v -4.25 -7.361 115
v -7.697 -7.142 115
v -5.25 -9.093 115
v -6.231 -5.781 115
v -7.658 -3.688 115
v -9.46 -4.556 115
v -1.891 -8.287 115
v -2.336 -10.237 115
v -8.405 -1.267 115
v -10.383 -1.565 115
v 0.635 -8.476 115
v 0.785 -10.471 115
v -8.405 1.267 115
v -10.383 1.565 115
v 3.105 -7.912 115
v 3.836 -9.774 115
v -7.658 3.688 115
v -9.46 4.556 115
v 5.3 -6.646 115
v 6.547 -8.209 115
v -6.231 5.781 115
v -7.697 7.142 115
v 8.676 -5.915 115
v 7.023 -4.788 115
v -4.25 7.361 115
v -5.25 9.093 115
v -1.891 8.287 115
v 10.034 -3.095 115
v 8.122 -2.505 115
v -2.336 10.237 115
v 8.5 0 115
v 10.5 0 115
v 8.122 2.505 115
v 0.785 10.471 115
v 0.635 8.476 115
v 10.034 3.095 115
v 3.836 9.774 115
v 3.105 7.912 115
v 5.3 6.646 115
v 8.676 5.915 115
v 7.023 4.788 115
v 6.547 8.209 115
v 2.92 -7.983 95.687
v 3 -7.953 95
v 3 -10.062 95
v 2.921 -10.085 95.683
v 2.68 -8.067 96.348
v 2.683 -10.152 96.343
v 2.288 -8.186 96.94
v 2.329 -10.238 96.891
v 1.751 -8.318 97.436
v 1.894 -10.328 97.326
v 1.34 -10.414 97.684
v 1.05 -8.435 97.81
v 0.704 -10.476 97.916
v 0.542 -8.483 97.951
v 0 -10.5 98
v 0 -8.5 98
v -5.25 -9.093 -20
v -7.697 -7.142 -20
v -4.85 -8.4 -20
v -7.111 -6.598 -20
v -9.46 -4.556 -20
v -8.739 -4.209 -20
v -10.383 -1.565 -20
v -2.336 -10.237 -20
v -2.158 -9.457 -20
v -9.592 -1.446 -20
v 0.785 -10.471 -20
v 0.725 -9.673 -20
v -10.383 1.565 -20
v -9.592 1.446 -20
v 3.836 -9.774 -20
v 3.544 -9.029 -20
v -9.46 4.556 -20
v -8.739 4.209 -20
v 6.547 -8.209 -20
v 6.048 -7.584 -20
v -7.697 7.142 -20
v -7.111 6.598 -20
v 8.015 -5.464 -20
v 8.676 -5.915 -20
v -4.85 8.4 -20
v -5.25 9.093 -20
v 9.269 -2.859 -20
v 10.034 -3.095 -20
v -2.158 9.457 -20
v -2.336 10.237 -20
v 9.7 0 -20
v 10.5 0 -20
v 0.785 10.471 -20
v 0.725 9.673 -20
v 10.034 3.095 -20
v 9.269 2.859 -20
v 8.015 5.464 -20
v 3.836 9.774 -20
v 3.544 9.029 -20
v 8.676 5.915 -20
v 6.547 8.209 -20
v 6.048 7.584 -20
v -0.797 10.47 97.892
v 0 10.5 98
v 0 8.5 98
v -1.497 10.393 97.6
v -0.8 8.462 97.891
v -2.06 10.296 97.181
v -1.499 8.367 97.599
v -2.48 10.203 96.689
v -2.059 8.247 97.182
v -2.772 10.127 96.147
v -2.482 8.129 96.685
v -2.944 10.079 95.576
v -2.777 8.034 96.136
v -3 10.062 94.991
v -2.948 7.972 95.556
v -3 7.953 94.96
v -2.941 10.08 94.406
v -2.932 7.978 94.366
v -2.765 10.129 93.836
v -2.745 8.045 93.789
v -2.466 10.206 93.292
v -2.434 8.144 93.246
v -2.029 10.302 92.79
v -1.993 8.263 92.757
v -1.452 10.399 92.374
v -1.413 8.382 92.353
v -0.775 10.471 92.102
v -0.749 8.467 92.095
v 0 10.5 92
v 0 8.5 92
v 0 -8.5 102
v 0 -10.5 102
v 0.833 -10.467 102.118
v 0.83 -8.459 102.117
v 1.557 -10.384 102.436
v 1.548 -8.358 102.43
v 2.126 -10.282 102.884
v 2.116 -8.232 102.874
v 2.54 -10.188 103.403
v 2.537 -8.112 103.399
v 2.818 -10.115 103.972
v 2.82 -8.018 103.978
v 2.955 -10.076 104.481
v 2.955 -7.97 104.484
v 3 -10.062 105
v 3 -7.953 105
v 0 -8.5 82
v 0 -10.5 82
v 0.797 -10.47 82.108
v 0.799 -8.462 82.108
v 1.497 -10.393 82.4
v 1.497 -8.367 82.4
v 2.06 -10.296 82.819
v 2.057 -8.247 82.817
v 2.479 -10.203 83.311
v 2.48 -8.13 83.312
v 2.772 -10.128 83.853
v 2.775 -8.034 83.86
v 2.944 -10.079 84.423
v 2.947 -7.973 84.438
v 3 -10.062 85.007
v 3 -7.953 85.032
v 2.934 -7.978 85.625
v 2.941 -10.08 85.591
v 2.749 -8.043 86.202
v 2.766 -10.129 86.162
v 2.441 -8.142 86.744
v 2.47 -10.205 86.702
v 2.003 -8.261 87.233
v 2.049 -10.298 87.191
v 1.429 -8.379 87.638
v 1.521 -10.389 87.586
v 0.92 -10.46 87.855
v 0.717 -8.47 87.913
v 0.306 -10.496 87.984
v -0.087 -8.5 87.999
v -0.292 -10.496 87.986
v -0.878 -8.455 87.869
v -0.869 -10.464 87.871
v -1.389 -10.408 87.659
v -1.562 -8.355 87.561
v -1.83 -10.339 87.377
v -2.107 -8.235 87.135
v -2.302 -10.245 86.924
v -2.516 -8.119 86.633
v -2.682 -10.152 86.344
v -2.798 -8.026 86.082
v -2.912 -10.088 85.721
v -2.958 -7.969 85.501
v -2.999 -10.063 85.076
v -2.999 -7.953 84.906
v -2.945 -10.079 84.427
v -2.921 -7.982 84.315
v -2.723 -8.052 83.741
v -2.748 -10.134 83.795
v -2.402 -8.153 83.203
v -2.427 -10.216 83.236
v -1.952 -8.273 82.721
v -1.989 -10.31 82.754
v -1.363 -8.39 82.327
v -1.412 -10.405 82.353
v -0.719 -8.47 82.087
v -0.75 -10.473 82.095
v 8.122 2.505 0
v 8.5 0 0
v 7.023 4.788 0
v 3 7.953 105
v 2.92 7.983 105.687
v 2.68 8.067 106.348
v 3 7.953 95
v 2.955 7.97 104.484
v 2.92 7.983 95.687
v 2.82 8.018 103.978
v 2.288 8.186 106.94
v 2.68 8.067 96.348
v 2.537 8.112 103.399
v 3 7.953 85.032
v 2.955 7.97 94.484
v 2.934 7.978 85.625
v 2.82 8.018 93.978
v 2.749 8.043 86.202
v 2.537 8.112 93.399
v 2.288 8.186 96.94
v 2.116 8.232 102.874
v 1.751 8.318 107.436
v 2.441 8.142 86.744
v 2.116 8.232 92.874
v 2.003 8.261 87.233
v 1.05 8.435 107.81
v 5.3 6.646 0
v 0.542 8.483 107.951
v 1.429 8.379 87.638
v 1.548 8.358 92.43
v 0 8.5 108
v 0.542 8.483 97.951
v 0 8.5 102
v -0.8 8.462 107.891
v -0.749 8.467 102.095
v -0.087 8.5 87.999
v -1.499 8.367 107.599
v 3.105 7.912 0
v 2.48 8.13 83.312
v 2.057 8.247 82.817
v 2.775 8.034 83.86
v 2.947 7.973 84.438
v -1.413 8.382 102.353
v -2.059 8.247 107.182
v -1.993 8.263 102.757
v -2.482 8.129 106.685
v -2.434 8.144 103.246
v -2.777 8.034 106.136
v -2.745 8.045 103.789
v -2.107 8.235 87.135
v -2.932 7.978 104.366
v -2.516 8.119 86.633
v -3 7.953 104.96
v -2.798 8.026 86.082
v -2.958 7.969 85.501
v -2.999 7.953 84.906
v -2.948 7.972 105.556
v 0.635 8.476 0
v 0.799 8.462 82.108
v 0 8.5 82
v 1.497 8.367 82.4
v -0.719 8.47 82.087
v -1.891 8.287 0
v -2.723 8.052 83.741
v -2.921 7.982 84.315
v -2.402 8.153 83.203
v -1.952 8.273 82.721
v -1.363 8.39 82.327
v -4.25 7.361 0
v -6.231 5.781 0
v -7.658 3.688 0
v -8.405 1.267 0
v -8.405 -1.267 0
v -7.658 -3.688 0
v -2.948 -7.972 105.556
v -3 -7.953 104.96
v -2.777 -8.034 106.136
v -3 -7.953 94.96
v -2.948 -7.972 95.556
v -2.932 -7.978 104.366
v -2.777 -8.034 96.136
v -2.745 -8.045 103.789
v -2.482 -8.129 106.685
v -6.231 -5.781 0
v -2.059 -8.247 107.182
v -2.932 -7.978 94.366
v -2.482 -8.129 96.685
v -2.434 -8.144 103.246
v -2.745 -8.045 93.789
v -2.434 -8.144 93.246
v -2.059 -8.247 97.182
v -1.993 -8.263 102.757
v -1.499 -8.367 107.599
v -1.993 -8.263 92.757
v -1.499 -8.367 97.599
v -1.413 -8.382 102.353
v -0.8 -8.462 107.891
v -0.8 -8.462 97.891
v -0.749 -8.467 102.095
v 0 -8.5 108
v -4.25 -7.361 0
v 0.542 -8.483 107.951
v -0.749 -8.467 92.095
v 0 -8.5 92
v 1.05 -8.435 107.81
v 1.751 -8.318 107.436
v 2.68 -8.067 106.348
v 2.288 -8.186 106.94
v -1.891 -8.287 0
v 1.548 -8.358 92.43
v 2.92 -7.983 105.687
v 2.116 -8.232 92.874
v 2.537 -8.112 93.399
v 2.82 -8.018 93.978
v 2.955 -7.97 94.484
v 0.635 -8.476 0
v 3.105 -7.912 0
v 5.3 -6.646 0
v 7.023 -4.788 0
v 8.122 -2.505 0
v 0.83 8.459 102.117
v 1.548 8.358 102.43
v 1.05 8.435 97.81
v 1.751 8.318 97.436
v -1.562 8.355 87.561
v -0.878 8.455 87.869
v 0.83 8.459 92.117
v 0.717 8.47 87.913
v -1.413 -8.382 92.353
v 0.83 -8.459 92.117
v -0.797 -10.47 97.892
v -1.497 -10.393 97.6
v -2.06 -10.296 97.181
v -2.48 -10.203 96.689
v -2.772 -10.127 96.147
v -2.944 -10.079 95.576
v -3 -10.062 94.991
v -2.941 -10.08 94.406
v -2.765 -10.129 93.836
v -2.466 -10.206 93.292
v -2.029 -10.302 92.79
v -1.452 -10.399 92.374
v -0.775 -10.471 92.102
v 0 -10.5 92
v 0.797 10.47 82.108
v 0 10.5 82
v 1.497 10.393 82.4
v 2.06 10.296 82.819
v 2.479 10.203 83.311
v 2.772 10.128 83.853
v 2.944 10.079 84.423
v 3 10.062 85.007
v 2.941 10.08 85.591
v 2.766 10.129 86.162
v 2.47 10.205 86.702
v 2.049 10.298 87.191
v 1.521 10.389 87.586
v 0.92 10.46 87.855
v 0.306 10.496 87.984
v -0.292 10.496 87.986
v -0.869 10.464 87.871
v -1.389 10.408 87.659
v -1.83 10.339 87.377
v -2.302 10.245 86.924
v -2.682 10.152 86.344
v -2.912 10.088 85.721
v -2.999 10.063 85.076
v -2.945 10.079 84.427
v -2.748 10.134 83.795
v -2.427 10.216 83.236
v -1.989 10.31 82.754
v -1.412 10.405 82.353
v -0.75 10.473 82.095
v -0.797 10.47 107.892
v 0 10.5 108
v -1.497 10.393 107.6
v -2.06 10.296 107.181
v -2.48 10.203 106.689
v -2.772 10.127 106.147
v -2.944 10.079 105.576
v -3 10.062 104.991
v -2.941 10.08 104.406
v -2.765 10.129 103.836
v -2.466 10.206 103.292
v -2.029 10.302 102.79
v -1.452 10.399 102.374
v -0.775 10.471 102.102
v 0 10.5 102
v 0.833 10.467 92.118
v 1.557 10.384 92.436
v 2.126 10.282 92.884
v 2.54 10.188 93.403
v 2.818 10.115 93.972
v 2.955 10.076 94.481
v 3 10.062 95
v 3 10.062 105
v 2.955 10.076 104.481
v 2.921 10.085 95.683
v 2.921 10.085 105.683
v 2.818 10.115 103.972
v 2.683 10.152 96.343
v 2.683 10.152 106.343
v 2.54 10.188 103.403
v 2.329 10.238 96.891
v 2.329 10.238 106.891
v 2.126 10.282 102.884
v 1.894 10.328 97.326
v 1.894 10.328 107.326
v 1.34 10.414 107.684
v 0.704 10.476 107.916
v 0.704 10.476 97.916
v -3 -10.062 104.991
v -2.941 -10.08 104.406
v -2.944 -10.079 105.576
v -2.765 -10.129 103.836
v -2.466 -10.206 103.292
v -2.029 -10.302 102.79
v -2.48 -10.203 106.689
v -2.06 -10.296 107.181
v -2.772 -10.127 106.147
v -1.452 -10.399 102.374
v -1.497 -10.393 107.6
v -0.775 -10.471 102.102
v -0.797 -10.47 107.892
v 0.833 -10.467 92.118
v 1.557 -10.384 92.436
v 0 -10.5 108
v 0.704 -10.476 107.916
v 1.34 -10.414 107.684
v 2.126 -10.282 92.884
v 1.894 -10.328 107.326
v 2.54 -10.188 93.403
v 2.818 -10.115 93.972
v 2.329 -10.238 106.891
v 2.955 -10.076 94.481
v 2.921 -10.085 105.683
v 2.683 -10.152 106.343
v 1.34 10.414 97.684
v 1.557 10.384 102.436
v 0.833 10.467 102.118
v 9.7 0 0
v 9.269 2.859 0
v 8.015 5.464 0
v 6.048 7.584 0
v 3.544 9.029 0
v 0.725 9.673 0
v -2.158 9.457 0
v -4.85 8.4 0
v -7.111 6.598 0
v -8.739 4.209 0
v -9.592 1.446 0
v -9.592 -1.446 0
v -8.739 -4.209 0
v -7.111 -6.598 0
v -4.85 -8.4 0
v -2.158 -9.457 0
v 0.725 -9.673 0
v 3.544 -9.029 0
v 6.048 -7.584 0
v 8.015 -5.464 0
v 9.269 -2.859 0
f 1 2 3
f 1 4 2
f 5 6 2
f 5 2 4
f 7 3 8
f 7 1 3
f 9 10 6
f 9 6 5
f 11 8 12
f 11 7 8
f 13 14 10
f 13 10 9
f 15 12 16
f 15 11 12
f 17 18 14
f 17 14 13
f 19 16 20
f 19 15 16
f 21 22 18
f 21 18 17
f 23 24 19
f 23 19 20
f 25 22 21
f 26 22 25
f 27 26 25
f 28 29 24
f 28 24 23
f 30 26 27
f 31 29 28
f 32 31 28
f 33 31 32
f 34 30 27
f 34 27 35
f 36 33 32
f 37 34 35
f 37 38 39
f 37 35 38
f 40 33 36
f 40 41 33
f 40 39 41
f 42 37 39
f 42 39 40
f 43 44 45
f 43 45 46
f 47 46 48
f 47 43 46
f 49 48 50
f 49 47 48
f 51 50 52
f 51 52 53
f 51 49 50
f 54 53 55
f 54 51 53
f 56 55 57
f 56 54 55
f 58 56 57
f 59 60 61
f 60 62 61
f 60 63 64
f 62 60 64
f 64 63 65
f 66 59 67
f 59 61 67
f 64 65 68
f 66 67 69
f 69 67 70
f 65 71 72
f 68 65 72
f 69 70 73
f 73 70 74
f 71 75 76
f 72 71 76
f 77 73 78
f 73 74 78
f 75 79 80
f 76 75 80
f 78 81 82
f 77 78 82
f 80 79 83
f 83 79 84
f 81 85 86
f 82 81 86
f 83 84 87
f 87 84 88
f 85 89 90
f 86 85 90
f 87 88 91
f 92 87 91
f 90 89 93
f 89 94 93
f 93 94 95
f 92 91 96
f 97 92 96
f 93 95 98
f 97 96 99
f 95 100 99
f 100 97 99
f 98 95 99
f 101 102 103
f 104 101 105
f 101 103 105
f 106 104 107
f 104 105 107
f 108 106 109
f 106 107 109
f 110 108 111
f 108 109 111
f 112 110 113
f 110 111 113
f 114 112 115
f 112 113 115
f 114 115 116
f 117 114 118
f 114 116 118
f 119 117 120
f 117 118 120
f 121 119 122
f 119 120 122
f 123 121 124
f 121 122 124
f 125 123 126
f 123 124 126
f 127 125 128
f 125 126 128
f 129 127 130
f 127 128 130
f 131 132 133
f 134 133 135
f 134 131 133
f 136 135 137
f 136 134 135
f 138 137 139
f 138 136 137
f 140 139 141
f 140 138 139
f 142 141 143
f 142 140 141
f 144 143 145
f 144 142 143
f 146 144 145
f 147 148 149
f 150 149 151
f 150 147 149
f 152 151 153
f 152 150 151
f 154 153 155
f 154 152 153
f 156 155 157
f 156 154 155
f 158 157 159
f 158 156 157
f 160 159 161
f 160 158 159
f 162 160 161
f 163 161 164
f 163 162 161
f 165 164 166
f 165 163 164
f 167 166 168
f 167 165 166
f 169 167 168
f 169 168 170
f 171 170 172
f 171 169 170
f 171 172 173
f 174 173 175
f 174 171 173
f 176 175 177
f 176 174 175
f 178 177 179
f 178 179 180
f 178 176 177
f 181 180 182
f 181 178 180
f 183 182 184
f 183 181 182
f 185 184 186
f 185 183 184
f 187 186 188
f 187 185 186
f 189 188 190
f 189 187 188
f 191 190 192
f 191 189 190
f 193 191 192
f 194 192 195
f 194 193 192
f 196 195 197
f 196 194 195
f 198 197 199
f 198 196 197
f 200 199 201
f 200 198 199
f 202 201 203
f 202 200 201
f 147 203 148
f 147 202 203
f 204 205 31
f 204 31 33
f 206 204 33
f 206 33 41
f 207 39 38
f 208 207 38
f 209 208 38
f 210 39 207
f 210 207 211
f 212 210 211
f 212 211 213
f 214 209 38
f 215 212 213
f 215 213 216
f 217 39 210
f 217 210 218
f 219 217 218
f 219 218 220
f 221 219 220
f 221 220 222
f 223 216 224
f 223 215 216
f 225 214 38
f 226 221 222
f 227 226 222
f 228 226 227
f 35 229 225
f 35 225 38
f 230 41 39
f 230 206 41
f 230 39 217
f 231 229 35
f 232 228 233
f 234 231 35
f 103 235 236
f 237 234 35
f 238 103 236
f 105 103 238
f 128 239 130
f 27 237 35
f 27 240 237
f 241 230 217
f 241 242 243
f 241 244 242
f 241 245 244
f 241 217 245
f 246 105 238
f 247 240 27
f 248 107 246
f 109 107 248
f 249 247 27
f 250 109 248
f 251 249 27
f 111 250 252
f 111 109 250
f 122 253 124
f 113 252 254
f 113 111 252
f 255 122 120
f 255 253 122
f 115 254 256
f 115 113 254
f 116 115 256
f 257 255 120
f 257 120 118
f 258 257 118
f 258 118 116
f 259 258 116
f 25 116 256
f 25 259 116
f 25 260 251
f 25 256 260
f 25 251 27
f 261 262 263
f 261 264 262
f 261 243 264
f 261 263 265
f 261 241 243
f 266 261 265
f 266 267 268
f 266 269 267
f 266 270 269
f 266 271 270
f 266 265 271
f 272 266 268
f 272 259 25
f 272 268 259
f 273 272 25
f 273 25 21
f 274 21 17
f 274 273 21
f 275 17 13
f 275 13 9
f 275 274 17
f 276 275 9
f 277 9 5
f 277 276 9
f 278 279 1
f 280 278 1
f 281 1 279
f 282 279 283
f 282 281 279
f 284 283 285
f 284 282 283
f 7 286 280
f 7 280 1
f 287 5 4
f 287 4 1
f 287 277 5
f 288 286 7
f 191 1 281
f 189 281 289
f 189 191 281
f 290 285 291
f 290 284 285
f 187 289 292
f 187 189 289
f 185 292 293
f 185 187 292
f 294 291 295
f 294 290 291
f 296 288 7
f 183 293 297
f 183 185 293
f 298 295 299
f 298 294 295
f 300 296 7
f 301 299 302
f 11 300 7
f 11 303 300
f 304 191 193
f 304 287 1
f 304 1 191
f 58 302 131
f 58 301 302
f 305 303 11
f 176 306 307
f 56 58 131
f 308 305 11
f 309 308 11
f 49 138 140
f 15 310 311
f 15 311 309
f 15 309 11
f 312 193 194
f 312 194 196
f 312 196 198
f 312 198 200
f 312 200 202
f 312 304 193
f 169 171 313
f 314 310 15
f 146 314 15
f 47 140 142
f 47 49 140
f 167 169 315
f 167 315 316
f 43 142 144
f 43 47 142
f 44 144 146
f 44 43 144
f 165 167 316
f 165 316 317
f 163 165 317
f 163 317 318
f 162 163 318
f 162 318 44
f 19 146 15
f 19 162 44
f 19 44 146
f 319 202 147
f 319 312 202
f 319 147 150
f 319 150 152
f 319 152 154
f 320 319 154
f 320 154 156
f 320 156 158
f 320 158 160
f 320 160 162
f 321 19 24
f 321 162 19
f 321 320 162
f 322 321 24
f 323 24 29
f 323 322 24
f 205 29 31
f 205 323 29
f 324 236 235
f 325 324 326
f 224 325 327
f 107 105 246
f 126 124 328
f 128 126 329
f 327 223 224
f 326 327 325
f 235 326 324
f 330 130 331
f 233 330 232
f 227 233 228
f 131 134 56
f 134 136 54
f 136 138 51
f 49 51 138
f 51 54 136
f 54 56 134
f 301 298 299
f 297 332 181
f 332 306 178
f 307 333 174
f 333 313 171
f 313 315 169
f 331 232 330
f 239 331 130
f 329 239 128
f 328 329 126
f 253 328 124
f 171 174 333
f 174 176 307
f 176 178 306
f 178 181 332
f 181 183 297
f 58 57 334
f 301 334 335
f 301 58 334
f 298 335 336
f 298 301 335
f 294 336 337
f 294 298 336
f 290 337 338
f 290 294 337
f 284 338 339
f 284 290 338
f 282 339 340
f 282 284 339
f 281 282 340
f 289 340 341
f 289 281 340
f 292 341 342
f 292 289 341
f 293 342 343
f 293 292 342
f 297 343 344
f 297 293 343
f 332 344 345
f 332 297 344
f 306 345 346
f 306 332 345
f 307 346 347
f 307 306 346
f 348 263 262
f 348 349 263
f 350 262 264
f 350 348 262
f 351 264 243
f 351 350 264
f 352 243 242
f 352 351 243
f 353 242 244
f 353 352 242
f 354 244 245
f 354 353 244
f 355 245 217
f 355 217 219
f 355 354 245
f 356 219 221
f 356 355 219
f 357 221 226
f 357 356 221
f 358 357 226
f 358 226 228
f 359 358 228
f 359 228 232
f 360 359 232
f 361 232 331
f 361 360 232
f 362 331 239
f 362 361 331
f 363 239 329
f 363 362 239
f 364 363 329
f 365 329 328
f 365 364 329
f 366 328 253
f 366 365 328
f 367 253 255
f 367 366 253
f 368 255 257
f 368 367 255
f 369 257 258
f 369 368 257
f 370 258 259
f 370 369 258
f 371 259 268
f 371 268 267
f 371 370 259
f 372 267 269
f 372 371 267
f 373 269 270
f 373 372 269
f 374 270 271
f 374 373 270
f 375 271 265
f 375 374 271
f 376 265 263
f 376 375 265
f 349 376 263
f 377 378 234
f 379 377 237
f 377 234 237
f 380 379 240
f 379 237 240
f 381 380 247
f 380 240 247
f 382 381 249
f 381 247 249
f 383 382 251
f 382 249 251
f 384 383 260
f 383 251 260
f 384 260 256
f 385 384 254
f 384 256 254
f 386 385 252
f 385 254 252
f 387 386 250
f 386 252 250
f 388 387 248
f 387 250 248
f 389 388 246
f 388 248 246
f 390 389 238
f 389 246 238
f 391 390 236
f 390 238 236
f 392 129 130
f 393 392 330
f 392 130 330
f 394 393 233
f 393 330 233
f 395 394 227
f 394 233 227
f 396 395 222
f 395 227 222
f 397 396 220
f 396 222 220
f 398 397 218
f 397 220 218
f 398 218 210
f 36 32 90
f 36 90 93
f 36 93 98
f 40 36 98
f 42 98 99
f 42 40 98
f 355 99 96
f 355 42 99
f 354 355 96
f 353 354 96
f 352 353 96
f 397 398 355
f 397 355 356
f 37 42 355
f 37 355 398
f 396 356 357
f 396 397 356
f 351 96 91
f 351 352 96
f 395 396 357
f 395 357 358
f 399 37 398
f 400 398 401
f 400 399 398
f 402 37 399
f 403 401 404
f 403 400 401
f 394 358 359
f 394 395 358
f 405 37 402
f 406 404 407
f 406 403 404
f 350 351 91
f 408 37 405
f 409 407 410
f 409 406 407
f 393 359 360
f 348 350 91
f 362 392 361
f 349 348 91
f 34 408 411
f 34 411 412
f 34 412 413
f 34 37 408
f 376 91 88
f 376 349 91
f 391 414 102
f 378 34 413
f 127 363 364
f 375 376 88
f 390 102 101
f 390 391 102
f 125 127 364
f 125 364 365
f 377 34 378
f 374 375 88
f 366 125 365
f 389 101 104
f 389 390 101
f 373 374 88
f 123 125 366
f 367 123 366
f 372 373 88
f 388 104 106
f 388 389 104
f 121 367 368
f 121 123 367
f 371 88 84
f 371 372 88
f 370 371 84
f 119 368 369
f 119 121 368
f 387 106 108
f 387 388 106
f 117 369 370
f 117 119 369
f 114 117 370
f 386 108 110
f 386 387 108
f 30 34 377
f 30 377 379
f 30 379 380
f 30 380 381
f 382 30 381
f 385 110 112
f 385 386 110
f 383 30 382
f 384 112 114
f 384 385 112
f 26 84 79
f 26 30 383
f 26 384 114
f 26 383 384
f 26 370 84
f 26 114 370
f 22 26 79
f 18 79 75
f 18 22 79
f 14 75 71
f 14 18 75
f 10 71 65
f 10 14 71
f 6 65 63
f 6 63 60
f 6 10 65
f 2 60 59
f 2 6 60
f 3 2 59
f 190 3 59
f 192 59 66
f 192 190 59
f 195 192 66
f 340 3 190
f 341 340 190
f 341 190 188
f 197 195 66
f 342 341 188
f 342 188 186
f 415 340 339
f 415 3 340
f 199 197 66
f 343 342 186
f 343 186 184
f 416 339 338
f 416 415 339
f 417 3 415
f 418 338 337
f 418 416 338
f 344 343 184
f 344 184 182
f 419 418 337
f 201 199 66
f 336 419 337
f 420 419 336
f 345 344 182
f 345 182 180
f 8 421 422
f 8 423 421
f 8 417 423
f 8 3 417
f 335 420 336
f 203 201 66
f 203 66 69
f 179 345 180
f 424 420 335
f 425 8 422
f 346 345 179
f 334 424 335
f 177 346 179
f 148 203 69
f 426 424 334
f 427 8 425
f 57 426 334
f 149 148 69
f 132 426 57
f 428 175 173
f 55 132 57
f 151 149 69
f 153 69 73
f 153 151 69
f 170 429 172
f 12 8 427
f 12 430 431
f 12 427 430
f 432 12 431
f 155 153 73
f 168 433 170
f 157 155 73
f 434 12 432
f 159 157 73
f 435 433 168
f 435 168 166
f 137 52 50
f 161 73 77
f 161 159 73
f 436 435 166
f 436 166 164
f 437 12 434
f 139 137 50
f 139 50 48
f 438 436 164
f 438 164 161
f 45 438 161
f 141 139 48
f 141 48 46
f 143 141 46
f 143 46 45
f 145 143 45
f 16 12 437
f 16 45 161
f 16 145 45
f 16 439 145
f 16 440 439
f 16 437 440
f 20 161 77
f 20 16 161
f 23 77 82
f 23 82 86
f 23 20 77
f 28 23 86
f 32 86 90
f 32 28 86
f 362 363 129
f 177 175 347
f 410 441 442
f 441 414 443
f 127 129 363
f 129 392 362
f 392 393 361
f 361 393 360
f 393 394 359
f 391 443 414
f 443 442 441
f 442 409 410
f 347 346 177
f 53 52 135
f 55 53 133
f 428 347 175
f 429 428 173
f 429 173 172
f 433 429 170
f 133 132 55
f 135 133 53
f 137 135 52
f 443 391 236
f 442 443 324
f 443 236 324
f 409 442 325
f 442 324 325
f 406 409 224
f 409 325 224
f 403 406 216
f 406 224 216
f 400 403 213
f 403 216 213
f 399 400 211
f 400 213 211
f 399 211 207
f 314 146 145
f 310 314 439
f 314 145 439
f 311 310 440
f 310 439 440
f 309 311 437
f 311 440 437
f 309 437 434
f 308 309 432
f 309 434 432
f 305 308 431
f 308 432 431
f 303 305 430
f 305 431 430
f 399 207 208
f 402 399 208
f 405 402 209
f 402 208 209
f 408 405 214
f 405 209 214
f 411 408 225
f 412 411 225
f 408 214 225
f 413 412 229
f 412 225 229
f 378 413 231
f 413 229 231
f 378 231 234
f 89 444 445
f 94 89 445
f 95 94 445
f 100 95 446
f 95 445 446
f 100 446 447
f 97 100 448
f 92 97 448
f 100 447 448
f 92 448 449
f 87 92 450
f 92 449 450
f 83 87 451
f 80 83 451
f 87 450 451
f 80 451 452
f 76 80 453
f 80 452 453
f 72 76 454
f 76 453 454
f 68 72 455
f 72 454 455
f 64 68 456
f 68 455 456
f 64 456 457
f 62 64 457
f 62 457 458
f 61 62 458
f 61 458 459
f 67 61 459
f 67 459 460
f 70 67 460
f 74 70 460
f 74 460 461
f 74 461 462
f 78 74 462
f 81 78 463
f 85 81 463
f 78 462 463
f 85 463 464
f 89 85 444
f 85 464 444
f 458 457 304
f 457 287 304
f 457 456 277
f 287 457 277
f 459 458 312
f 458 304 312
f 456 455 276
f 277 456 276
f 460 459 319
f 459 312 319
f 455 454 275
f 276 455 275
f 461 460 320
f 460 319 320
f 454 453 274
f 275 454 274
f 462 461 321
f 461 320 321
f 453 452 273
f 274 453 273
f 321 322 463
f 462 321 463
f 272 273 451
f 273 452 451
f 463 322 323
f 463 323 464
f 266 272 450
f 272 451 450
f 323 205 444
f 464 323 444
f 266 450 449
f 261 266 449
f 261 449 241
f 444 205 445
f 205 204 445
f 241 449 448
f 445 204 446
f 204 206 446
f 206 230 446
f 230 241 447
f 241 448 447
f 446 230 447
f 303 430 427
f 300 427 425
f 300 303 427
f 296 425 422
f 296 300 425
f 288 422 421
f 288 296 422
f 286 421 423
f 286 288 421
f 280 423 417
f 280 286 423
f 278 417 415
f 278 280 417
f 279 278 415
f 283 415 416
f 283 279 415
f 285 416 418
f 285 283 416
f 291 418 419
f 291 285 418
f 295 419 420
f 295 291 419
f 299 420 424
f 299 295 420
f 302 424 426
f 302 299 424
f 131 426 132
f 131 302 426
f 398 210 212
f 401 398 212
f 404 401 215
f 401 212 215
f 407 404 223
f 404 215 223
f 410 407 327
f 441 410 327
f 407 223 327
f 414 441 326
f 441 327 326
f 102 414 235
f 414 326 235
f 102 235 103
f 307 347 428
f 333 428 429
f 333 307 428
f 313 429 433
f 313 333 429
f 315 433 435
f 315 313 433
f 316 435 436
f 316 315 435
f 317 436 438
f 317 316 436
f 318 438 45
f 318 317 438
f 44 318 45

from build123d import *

# Parameters (mm, degrees)
F0_R     = 10.5
F0_R_2   = 9.7
F0_R_3   = 9.5
F0_R_4   = 8.5
F2_DEPTH = 115
F3_DEPTH = 20
F4_DEPTH = 12.5


with BuildPart() as f2:
    # F0 (on Top) → F2 (new body)
    with BuildSketch(Plane.XY):
        Circle(F0_R)
        Circle(F0_R_2, mode=Mode.SUBTRACT)
        Circle(F0_R_2)
        Circle(F0_R_3, mode=Mode.SUBTRACT)
        Circle(F0_R_3)
        Circle(F0_R_4, mode=Mode.SUBTRACT)
    extrude(amount=F2_DEPTH)

    # F0 (on Top) → F3 (join)
    with BuildSketch(Plane.XY):
        Circle(F0_R)
        Circle(F0_R_2, mode=Mode.SUBTRACT)
    extrude(amount=-F3_DEPTH)

    # F1 (on Front) → F4 (cut, symmetric)
    with BuildSketch(Plane.XZ):
        with BuildLine():
            Line((-0.0001868698, 87.999952428), (-0.0001868698, 81.999952428))
            ThreePointArc((-0.0001868698, 81.999952428), (2.1211334738, 82.8786320845), (2.9998131302, 84.999952428))
            ThreePointArc((2.9998131302, 84.999952428), (2.1211334738, 87.1212727716), (-0.0001868698, 87.999952428))
        make_face()
        with BuildLine():
            ThreePointArc((-0.0001868698, 87.999952428), (-3.0001868698, 84.999952428), (-0.0001868698, 81.999952428))
            Line((-0.0001868698, 81.999952428), (-0.0001868698, 87.999952428))
        make_face()
        with BuildLine():
            ThreePointArc((-0.0001868698, 97.999952428), (-3.0001868698, 94.999952428), (-0.0001868698, 91.999952428))
            Line((-0.0001868698, 91.999952428), (-0.0001868698, 97.999952428))
        make_face()
        with BuildLine():
            Line((-0.0001868698, 97.999952428), (-0.0001868698, 91.999952428))
            ThreePointArc((-0.0001868698, 91.999952428), (2.1211334738, 92.8786320845), (2.9998131302, 94.999952428))
            ThreePointArc((2.9998131302, 94.999952428), (2.1211334738, 97.1212727716), (-0.0001868698, 97.999952428))
        make_face()
        with BuildLine():
            ThreePointArc((2.9998131302, 104.999952428), (2.1211334738, 107.1212727716), (-0.0001868698, 107.999952428))
            Line((-0.0001868698, 107.999952428), (-0.0001868698, 101.999952428))
            ThreePointArc((-0.0001868698, 101.999952428), (2.1211334738, 102.8786320845), (2.9998131302, 104.999952428))
        make_face()
        with BuildLine():
            Line((-0.0001868698, 101.999952428), (-0.0001868698, 107.999952428))
            ThreePointArc((-0.0001868698, 107.999952428), (-3.0001868698, 104.999952428), (-0.0001868698, 101.999952428))
        make_face()
    extrude(amount=F4_DEPTH, both=True, mode=Mode.SUBTRACT)


solid = f2.part
